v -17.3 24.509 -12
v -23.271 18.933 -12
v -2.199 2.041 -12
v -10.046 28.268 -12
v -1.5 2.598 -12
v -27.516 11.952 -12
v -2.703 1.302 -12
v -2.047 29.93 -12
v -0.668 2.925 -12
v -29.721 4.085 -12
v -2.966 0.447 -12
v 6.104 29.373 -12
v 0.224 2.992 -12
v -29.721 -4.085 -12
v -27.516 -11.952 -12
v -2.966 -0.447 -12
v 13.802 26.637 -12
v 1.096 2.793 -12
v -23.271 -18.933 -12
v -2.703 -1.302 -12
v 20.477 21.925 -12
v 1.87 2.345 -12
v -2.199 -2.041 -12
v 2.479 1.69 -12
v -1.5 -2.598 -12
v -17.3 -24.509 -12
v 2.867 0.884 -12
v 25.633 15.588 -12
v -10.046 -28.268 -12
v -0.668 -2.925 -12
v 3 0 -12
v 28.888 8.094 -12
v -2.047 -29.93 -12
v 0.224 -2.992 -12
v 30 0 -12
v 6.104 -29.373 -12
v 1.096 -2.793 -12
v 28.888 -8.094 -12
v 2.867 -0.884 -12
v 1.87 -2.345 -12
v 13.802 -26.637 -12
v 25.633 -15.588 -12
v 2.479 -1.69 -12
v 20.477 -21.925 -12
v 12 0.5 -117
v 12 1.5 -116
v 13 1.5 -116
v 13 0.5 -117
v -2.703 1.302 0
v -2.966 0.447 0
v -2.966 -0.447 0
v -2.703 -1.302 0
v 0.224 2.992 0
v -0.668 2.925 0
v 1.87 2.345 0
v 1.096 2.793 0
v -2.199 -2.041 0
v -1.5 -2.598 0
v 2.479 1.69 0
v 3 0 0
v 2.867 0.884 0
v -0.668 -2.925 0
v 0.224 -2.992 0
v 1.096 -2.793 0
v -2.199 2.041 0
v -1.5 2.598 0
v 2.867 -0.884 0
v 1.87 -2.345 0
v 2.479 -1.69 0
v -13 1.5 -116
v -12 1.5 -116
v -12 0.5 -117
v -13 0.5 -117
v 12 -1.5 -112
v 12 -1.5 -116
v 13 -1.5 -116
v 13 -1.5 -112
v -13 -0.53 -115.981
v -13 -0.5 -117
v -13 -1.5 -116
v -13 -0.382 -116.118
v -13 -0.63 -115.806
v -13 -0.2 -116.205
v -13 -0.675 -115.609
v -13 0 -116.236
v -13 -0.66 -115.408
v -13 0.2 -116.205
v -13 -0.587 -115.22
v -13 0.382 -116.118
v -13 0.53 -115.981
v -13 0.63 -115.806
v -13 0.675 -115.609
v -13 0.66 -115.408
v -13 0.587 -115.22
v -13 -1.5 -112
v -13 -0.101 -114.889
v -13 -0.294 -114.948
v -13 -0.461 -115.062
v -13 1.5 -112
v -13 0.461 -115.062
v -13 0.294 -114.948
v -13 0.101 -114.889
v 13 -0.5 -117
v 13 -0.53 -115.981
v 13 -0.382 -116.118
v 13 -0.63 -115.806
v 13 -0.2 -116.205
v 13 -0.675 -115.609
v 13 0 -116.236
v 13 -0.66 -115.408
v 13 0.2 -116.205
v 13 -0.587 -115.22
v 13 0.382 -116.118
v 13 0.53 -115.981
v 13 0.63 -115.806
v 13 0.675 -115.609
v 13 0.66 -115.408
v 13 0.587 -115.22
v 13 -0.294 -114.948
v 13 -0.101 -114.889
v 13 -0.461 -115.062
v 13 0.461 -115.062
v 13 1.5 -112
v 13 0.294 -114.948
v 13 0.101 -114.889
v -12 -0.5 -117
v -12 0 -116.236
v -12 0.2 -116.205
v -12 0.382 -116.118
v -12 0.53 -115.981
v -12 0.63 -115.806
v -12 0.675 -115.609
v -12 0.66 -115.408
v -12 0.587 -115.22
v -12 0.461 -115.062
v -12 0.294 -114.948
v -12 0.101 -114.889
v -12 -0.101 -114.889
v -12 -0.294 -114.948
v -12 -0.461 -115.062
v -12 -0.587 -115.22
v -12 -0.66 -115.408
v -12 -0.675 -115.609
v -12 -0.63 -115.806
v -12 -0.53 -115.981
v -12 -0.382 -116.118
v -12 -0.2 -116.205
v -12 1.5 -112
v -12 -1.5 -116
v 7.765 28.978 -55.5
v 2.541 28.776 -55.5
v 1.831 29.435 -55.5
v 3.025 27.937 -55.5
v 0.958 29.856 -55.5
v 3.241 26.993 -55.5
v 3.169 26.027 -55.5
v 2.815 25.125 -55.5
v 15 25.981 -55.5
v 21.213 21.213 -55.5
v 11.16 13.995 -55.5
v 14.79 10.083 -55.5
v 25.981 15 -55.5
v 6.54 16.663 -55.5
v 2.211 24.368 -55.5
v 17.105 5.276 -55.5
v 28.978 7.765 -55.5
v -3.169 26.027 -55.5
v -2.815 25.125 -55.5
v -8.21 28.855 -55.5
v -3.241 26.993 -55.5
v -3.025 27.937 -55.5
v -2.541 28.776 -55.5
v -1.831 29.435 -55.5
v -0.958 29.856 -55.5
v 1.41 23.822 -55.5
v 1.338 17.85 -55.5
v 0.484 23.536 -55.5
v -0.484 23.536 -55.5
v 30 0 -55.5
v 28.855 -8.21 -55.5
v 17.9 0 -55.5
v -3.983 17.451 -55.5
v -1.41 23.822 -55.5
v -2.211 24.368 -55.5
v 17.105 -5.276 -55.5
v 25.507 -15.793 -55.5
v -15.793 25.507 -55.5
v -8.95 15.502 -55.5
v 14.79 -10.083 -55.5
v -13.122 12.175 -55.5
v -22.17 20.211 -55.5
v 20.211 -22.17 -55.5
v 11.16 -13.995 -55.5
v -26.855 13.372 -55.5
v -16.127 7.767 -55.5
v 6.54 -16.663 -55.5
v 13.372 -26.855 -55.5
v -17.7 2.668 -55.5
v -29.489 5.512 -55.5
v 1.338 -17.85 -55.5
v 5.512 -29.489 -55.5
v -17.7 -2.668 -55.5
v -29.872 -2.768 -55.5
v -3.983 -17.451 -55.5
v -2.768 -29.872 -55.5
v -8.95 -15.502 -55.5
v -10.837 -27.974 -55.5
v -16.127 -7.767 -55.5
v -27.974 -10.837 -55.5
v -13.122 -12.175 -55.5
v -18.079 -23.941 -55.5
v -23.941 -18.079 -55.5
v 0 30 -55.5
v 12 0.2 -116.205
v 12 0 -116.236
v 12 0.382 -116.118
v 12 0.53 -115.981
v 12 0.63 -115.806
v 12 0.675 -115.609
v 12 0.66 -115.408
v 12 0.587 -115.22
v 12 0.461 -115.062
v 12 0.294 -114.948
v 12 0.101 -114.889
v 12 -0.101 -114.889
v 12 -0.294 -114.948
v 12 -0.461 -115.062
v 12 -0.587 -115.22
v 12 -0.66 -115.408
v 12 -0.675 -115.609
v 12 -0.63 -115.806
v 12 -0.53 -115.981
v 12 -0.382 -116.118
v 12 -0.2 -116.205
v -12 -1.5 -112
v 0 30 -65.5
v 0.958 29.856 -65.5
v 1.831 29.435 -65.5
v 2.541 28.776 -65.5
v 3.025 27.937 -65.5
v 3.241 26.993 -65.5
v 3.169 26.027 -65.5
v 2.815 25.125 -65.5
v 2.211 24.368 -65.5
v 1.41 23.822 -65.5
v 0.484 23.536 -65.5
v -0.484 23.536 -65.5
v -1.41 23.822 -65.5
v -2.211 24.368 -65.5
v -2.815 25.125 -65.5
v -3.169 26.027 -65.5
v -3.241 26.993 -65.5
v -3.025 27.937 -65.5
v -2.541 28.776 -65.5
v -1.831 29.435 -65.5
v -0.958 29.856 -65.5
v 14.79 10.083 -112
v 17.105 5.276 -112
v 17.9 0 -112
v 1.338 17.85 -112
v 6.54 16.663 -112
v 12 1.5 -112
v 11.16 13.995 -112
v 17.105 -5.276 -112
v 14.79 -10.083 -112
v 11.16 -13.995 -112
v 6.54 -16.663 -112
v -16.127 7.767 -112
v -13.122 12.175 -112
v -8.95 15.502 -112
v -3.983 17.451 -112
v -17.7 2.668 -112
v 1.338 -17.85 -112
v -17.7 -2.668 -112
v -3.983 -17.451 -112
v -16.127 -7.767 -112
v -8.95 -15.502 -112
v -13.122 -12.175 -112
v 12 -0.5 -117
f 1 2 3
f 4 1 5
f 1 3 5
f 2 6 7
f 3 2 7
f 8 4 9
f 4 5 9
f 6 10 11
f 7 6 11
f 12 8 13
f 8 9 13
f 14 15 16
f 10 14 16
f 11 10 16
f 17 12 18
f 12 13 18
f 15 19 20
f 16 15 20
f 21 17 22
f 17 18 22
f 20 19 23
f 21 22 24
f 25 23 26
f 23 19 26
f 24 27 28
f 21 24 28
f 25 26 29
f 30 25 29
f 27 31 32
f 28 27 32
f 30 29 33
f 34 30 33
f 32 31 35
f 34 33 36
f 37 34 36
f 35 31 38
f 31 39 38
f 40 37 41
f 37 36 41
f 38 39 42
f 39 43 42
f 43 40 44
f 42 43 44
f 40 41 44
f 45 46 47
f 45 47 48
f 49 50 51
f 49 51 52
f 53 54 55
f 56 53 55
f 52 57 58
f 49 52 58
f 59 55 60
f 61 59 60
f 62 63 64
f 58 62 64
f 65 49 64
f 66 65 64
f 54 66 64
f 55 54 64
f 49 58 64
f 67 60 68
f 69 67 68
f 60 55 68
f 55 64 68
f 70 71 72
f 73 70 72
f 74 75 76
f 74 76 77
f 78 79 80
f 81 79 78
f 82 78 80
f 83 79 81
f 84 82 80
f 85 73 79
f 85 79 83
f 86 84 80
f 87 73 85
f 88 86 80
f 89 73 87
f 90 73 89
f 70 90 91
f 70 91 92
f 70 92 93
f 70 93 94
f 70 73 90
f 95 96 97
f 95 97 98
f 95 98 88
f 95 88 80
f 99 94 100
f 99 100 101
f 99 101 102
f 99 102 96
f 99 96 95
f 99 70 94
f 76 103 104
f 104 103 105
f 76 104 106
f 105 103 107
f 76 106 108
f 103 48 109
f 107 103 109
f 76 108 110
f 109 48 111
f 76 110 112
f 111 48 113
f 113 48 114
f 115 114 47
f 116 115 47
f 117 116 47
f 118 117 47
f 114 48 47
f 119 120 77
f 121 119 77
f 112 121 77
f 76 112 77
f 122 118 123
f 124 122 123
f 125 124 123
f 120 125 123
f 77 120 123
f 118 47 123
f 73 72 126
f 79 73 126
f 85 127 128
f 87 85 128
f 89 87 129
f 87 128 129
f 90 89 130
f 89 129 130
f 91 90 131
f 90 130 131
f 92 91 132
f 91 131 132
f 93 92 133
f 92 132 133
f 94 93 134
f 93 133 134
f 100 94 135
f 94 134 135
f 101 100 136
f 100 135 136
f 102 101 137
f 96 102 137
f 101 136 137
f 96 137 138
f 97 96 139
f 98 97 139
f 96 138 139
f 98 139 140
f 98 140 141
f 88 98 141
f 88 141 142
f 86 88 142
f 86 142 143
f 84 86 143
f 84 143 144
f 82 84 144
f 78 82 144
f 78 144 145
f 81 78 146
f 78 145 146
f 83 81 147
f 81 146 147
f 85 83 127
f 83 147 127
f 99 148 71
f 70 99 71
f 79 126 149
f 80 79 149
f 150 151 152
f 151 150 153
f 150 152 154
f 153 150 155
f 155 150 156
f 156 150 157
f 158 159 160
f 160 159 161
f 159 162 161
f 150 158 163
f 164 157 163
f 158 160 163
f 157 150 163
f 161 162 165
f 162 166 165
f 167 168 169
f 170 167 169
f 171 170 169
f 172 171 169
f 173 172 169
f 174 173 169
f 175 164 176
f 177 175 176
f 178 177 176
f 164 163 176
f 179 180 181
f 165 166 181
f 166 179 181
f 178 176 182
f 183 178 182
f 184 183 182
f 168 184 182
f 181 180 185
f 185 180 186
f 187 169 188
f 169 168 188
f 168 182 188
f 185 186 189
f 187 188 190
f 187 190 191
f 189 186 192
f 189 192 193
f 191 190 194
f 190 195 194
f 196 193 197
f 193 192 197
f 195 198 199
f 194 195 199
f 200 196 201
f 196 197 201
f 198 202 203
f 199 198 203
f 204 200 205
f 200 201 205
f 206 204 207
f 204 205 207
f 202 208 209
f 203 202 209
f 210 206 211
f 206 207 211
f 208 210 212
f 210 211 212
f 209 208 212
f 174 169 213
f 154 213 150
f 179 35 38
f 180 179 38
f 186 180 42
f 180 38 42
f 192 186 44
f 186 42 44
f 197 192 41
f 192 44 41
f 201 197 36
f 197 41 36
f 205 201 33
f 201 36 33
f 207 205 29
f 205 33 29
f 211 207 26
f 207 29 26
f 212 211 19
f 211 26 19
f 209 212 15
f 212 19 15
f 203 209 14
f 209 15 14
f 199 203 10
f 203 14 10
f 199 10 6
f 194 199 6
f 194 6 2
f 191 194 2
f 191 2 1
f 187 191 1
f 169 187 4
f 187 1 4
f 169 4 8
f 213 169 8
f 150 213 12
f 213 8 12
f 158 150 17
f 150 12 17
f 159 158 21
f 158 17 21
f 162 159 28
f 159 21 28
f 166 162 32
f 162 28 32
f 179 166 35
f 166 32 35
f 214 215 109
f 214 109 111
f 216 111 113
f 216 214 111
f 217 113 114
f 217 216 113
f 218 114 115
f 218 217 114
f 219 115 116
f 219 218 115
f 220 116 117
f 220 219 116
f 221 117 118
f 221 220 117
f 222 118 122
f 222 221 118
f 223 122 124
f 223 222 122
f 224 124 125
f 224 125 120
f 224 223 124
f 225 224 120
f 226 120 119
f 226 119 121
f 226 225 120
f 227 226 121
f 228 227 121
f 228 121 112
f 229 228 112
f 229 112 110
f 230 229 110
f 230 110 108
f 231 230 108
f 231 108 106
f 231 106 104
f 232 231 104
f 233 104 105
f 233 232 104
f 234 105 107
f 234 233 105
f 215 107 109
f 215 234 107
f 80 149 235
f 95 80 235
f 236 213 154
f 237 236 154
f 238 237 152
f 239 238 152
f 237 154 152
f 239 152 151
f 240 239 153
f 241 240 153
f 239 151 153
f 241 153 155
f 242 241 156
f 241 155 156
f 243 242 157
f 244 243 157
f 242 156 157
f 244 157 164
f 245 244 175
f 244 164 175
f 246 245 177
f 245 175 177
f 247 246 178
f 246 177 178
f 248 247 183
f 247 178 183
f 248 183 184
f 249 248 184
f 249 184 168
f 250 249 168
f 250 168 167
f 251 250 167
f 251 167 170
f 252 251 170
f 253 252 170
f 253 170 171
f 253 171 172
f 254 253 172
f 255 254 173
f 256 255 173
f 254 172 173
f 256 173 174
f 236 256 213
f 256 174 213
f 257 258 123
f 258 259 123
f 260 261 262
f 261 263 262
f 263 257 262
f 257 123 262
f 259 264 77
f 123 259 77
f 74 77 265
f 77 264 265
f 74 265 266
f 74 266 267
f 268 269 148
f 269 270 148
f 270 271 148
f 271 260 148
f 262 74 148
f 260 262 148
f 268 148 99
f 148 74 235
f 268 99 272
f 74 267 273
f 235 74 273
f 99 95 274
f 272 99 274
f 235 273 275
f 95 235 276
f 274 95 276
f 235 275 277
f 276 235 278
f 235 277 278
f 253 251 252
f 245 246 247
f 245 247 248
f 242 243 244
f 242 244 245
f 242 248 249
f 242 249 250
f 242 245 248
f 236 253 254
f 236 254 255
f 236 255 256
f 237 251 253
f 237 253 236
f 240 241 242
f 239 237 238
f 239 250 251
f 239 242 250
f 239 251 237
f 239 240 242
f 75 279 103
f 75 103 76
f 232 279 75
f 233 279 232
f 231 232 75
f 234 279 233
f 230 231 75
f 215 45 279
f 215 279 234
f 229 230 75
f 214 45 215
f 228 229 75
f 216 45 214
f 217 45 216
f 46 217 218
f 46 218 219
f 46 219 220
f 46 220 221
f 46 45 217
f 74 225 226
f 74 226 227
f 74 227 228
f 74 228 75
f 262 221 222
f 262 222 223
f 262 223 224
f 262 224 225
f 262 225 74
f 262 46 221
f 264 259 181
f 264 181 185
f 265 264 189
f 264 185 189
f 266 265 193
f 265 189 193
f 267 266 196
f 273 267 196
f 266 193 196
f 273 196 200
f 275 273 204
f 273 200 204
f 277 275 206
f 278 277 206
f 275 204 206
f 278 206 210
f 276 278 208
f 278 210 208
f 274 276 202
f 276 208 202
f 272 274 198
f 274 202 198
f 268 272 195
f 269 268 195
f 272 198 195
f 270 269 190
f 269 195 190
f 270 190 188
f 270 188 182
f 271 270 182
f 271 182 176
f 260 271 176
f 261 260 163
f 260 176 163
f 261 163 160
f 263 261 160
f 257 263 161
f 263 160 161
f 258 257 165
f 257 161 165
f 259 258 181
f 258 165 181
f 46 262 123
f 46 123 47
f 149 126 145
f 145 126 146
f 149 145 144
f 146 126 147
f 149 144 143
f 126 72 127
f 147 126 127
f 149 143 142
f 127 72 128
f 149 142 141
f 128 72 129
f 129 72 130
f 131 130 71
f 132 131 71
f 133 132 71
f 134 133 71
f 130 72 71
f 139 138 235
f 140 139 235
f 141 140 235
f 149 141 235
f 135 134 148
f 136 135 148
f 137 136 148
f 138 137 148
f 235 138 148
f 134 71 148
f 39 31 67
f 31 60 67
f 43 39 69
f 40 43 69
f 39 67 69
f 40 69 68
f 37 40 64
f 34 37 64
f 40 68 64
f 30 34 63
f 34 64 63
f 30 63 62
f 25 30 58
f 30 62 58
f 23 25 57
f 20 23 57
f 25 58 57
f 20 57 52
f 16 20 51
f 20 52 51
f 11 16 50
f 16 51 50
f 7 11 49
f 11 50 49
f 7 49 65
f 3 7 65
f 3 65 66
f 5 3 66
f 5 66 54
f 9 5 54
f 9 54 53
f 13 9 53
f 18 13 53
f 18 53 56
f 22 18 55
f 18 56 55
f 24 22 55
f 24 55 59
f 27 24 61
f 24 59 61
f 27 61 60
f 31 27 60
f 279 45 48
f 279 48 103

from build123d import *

# Parameters (mm, degrees)
SKETCH_5_R      = 3.25
EXTRUDE_1_DEPTH = 10
EXTRUDE_START   = 12
SKETCH_7_R      = 0.677279549
EXTRUDE_2_DEPTH = 1


with BuildPart() as part:
    # 草图4 → 旋转1 (revolve)
    with BuildSketch(Plane(origin=(0, 0, 0), x_dir=(0, 0, -1), z_dir=(1, 0, 0)), mode=Mode.PRIVATE) as revolve_1_sk:
        Polygon((0, 0), (112, 0), (112, 17.9), (55.5, 17.9), (55.5, 30), (12, 30), (12, 3), (0, 3), align=None)
    revolve(revolve_1_sk.sketch.rotate(Axis((0, 0, 0), (0, 0, -1)), 90), axis=Axis((0, 0, 0), (0, 0, -1)))

    # 草图5 → 凸台-拉伸1 (add)
    with BuildSketch(Plane(origin=(0, 0, -55.5), x_dir=(-1, 0, 0), z_dir=(0, 0, -1))):
        with Locations(Location((0, 26.75, 0), (0, 0, 90))):
            Circle(SKETCH_5_R)
    extrude(amount=EXTRUDE_1_DEPTH)

    # 草图7 → 凸台-拉伸2 (add)
    with BuildSketch(Plane(origin=(0, 0, 0), x_dir=(0, 0, -1), z_dir=(1, 0, 0)).offset(EXTRUDE_START)):
        Polygon((112, 0), (112, 1.5), (116, 1.5), (117, 0.5), (117, -0.5), (116, -1.5), (112, -1.5), align=None)
        with Locations((115.558241223, 0)):
            Circle(SKETCH_7_R, mode=Mode.SUBTRACT)
    extrude_2 = extrude(amount=EXTRUDE_2_DEPTH)

    # 镜向1: 凸台-拉伸2 across plane
    add(extrude_2.mirror(Plane(origin=(0, 0, 0), x_dir=(0, 0, 1), z_dir=(1, 0, 0))))


solid = part.part
